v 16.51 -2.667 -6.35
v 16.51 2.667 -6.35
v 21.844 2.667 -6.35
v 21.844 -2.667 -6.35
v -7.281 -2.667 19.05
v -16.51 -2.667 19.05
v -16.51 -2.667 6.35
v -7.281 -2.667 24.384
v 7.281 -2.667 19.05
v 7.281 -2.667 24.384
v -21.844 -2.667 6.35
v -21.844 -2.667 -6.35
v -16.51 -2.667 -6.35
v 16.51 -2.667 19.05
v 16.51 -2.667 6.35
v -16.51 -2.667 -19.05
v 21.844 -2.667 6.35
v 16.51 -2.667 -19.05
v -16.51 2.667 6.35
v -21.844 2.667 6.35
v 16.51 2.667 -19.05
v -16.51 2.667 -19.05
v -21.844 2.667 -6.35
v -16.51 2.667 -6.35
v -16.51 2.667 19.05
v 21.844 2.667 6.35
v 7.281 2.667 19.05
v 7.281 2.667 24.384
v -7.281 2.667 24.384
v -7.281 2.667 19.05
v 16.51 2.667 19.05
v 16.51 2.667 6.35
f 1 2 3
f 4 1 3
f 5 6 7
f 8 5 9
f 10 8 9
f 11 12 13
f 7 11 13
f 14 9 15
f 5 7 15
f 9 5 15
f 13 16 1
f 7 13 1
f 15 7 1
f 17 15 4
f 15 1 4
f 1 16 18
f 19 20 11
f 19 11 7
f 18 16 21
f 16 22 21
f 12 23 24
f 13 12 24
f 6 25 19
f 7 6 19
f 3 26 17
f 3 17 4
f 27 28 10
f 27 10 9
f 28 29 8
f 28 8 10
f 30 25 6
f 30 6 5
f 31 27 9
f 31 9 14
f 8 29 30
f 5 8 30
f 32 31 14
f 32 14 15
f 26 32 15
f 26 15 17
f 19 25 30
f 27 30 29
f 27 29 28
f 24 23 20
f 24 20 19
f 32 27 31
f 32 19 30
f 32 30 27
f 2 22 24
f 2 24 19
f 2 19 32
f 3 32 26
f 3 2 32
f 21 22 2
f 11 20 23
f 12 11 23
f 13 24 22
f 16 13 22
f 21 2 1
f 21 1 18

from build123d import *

# Parameters (mm, degrees)
SKETCH1_W           = 33.02
SKETCH1_H           = 38.1
BOSS_EXTRUDE1_DEPTH = 2.667
SKETCH2_W           = 14.562666666
SKETCH2_H           = 5.334
SKETCH2_W_2         = 5.334
SKETCH2_H_2         = 12.7
BOSS_EXTRUDE2_DEPTH = 5.334


with BuildPart() as part:
    # Sketch1 → Boss-Extrude1 (new body, symmetric)
    with BuildSketch(Plane(origin=(0, 0, 0), x_dir=(1, 0, 0), z_dir=(0, 1, 0))):
        Rectangle(SKETCH1_W, SKETCH1_H)
    extrude(amount=BOSS_EXTRUDE1_DEPTH, both=True)

    # Sketch2 → Boss-Extrude2 (add)
    with BuildSketch(Plane(origin=(0, 2.667, 0), x_dir=(1, 0, 0), z_dir=(0, 1, 0))):
        with Locations((0, -21.717)):
            Rectangle(SKETCH2_W, SKETCH2_H)
        with Locations((-19.177, 0)):
            Rectangle(SKETCH2_W_2, SKETCH2_H_2)
        with Locations((19.177, 0)):
            Rectangle(SKETCH2_W_2, SKETCH2_H_2)
    extrude(amount=-BOSS_EXTRUDE2_DEPTH)


solid = part.part
